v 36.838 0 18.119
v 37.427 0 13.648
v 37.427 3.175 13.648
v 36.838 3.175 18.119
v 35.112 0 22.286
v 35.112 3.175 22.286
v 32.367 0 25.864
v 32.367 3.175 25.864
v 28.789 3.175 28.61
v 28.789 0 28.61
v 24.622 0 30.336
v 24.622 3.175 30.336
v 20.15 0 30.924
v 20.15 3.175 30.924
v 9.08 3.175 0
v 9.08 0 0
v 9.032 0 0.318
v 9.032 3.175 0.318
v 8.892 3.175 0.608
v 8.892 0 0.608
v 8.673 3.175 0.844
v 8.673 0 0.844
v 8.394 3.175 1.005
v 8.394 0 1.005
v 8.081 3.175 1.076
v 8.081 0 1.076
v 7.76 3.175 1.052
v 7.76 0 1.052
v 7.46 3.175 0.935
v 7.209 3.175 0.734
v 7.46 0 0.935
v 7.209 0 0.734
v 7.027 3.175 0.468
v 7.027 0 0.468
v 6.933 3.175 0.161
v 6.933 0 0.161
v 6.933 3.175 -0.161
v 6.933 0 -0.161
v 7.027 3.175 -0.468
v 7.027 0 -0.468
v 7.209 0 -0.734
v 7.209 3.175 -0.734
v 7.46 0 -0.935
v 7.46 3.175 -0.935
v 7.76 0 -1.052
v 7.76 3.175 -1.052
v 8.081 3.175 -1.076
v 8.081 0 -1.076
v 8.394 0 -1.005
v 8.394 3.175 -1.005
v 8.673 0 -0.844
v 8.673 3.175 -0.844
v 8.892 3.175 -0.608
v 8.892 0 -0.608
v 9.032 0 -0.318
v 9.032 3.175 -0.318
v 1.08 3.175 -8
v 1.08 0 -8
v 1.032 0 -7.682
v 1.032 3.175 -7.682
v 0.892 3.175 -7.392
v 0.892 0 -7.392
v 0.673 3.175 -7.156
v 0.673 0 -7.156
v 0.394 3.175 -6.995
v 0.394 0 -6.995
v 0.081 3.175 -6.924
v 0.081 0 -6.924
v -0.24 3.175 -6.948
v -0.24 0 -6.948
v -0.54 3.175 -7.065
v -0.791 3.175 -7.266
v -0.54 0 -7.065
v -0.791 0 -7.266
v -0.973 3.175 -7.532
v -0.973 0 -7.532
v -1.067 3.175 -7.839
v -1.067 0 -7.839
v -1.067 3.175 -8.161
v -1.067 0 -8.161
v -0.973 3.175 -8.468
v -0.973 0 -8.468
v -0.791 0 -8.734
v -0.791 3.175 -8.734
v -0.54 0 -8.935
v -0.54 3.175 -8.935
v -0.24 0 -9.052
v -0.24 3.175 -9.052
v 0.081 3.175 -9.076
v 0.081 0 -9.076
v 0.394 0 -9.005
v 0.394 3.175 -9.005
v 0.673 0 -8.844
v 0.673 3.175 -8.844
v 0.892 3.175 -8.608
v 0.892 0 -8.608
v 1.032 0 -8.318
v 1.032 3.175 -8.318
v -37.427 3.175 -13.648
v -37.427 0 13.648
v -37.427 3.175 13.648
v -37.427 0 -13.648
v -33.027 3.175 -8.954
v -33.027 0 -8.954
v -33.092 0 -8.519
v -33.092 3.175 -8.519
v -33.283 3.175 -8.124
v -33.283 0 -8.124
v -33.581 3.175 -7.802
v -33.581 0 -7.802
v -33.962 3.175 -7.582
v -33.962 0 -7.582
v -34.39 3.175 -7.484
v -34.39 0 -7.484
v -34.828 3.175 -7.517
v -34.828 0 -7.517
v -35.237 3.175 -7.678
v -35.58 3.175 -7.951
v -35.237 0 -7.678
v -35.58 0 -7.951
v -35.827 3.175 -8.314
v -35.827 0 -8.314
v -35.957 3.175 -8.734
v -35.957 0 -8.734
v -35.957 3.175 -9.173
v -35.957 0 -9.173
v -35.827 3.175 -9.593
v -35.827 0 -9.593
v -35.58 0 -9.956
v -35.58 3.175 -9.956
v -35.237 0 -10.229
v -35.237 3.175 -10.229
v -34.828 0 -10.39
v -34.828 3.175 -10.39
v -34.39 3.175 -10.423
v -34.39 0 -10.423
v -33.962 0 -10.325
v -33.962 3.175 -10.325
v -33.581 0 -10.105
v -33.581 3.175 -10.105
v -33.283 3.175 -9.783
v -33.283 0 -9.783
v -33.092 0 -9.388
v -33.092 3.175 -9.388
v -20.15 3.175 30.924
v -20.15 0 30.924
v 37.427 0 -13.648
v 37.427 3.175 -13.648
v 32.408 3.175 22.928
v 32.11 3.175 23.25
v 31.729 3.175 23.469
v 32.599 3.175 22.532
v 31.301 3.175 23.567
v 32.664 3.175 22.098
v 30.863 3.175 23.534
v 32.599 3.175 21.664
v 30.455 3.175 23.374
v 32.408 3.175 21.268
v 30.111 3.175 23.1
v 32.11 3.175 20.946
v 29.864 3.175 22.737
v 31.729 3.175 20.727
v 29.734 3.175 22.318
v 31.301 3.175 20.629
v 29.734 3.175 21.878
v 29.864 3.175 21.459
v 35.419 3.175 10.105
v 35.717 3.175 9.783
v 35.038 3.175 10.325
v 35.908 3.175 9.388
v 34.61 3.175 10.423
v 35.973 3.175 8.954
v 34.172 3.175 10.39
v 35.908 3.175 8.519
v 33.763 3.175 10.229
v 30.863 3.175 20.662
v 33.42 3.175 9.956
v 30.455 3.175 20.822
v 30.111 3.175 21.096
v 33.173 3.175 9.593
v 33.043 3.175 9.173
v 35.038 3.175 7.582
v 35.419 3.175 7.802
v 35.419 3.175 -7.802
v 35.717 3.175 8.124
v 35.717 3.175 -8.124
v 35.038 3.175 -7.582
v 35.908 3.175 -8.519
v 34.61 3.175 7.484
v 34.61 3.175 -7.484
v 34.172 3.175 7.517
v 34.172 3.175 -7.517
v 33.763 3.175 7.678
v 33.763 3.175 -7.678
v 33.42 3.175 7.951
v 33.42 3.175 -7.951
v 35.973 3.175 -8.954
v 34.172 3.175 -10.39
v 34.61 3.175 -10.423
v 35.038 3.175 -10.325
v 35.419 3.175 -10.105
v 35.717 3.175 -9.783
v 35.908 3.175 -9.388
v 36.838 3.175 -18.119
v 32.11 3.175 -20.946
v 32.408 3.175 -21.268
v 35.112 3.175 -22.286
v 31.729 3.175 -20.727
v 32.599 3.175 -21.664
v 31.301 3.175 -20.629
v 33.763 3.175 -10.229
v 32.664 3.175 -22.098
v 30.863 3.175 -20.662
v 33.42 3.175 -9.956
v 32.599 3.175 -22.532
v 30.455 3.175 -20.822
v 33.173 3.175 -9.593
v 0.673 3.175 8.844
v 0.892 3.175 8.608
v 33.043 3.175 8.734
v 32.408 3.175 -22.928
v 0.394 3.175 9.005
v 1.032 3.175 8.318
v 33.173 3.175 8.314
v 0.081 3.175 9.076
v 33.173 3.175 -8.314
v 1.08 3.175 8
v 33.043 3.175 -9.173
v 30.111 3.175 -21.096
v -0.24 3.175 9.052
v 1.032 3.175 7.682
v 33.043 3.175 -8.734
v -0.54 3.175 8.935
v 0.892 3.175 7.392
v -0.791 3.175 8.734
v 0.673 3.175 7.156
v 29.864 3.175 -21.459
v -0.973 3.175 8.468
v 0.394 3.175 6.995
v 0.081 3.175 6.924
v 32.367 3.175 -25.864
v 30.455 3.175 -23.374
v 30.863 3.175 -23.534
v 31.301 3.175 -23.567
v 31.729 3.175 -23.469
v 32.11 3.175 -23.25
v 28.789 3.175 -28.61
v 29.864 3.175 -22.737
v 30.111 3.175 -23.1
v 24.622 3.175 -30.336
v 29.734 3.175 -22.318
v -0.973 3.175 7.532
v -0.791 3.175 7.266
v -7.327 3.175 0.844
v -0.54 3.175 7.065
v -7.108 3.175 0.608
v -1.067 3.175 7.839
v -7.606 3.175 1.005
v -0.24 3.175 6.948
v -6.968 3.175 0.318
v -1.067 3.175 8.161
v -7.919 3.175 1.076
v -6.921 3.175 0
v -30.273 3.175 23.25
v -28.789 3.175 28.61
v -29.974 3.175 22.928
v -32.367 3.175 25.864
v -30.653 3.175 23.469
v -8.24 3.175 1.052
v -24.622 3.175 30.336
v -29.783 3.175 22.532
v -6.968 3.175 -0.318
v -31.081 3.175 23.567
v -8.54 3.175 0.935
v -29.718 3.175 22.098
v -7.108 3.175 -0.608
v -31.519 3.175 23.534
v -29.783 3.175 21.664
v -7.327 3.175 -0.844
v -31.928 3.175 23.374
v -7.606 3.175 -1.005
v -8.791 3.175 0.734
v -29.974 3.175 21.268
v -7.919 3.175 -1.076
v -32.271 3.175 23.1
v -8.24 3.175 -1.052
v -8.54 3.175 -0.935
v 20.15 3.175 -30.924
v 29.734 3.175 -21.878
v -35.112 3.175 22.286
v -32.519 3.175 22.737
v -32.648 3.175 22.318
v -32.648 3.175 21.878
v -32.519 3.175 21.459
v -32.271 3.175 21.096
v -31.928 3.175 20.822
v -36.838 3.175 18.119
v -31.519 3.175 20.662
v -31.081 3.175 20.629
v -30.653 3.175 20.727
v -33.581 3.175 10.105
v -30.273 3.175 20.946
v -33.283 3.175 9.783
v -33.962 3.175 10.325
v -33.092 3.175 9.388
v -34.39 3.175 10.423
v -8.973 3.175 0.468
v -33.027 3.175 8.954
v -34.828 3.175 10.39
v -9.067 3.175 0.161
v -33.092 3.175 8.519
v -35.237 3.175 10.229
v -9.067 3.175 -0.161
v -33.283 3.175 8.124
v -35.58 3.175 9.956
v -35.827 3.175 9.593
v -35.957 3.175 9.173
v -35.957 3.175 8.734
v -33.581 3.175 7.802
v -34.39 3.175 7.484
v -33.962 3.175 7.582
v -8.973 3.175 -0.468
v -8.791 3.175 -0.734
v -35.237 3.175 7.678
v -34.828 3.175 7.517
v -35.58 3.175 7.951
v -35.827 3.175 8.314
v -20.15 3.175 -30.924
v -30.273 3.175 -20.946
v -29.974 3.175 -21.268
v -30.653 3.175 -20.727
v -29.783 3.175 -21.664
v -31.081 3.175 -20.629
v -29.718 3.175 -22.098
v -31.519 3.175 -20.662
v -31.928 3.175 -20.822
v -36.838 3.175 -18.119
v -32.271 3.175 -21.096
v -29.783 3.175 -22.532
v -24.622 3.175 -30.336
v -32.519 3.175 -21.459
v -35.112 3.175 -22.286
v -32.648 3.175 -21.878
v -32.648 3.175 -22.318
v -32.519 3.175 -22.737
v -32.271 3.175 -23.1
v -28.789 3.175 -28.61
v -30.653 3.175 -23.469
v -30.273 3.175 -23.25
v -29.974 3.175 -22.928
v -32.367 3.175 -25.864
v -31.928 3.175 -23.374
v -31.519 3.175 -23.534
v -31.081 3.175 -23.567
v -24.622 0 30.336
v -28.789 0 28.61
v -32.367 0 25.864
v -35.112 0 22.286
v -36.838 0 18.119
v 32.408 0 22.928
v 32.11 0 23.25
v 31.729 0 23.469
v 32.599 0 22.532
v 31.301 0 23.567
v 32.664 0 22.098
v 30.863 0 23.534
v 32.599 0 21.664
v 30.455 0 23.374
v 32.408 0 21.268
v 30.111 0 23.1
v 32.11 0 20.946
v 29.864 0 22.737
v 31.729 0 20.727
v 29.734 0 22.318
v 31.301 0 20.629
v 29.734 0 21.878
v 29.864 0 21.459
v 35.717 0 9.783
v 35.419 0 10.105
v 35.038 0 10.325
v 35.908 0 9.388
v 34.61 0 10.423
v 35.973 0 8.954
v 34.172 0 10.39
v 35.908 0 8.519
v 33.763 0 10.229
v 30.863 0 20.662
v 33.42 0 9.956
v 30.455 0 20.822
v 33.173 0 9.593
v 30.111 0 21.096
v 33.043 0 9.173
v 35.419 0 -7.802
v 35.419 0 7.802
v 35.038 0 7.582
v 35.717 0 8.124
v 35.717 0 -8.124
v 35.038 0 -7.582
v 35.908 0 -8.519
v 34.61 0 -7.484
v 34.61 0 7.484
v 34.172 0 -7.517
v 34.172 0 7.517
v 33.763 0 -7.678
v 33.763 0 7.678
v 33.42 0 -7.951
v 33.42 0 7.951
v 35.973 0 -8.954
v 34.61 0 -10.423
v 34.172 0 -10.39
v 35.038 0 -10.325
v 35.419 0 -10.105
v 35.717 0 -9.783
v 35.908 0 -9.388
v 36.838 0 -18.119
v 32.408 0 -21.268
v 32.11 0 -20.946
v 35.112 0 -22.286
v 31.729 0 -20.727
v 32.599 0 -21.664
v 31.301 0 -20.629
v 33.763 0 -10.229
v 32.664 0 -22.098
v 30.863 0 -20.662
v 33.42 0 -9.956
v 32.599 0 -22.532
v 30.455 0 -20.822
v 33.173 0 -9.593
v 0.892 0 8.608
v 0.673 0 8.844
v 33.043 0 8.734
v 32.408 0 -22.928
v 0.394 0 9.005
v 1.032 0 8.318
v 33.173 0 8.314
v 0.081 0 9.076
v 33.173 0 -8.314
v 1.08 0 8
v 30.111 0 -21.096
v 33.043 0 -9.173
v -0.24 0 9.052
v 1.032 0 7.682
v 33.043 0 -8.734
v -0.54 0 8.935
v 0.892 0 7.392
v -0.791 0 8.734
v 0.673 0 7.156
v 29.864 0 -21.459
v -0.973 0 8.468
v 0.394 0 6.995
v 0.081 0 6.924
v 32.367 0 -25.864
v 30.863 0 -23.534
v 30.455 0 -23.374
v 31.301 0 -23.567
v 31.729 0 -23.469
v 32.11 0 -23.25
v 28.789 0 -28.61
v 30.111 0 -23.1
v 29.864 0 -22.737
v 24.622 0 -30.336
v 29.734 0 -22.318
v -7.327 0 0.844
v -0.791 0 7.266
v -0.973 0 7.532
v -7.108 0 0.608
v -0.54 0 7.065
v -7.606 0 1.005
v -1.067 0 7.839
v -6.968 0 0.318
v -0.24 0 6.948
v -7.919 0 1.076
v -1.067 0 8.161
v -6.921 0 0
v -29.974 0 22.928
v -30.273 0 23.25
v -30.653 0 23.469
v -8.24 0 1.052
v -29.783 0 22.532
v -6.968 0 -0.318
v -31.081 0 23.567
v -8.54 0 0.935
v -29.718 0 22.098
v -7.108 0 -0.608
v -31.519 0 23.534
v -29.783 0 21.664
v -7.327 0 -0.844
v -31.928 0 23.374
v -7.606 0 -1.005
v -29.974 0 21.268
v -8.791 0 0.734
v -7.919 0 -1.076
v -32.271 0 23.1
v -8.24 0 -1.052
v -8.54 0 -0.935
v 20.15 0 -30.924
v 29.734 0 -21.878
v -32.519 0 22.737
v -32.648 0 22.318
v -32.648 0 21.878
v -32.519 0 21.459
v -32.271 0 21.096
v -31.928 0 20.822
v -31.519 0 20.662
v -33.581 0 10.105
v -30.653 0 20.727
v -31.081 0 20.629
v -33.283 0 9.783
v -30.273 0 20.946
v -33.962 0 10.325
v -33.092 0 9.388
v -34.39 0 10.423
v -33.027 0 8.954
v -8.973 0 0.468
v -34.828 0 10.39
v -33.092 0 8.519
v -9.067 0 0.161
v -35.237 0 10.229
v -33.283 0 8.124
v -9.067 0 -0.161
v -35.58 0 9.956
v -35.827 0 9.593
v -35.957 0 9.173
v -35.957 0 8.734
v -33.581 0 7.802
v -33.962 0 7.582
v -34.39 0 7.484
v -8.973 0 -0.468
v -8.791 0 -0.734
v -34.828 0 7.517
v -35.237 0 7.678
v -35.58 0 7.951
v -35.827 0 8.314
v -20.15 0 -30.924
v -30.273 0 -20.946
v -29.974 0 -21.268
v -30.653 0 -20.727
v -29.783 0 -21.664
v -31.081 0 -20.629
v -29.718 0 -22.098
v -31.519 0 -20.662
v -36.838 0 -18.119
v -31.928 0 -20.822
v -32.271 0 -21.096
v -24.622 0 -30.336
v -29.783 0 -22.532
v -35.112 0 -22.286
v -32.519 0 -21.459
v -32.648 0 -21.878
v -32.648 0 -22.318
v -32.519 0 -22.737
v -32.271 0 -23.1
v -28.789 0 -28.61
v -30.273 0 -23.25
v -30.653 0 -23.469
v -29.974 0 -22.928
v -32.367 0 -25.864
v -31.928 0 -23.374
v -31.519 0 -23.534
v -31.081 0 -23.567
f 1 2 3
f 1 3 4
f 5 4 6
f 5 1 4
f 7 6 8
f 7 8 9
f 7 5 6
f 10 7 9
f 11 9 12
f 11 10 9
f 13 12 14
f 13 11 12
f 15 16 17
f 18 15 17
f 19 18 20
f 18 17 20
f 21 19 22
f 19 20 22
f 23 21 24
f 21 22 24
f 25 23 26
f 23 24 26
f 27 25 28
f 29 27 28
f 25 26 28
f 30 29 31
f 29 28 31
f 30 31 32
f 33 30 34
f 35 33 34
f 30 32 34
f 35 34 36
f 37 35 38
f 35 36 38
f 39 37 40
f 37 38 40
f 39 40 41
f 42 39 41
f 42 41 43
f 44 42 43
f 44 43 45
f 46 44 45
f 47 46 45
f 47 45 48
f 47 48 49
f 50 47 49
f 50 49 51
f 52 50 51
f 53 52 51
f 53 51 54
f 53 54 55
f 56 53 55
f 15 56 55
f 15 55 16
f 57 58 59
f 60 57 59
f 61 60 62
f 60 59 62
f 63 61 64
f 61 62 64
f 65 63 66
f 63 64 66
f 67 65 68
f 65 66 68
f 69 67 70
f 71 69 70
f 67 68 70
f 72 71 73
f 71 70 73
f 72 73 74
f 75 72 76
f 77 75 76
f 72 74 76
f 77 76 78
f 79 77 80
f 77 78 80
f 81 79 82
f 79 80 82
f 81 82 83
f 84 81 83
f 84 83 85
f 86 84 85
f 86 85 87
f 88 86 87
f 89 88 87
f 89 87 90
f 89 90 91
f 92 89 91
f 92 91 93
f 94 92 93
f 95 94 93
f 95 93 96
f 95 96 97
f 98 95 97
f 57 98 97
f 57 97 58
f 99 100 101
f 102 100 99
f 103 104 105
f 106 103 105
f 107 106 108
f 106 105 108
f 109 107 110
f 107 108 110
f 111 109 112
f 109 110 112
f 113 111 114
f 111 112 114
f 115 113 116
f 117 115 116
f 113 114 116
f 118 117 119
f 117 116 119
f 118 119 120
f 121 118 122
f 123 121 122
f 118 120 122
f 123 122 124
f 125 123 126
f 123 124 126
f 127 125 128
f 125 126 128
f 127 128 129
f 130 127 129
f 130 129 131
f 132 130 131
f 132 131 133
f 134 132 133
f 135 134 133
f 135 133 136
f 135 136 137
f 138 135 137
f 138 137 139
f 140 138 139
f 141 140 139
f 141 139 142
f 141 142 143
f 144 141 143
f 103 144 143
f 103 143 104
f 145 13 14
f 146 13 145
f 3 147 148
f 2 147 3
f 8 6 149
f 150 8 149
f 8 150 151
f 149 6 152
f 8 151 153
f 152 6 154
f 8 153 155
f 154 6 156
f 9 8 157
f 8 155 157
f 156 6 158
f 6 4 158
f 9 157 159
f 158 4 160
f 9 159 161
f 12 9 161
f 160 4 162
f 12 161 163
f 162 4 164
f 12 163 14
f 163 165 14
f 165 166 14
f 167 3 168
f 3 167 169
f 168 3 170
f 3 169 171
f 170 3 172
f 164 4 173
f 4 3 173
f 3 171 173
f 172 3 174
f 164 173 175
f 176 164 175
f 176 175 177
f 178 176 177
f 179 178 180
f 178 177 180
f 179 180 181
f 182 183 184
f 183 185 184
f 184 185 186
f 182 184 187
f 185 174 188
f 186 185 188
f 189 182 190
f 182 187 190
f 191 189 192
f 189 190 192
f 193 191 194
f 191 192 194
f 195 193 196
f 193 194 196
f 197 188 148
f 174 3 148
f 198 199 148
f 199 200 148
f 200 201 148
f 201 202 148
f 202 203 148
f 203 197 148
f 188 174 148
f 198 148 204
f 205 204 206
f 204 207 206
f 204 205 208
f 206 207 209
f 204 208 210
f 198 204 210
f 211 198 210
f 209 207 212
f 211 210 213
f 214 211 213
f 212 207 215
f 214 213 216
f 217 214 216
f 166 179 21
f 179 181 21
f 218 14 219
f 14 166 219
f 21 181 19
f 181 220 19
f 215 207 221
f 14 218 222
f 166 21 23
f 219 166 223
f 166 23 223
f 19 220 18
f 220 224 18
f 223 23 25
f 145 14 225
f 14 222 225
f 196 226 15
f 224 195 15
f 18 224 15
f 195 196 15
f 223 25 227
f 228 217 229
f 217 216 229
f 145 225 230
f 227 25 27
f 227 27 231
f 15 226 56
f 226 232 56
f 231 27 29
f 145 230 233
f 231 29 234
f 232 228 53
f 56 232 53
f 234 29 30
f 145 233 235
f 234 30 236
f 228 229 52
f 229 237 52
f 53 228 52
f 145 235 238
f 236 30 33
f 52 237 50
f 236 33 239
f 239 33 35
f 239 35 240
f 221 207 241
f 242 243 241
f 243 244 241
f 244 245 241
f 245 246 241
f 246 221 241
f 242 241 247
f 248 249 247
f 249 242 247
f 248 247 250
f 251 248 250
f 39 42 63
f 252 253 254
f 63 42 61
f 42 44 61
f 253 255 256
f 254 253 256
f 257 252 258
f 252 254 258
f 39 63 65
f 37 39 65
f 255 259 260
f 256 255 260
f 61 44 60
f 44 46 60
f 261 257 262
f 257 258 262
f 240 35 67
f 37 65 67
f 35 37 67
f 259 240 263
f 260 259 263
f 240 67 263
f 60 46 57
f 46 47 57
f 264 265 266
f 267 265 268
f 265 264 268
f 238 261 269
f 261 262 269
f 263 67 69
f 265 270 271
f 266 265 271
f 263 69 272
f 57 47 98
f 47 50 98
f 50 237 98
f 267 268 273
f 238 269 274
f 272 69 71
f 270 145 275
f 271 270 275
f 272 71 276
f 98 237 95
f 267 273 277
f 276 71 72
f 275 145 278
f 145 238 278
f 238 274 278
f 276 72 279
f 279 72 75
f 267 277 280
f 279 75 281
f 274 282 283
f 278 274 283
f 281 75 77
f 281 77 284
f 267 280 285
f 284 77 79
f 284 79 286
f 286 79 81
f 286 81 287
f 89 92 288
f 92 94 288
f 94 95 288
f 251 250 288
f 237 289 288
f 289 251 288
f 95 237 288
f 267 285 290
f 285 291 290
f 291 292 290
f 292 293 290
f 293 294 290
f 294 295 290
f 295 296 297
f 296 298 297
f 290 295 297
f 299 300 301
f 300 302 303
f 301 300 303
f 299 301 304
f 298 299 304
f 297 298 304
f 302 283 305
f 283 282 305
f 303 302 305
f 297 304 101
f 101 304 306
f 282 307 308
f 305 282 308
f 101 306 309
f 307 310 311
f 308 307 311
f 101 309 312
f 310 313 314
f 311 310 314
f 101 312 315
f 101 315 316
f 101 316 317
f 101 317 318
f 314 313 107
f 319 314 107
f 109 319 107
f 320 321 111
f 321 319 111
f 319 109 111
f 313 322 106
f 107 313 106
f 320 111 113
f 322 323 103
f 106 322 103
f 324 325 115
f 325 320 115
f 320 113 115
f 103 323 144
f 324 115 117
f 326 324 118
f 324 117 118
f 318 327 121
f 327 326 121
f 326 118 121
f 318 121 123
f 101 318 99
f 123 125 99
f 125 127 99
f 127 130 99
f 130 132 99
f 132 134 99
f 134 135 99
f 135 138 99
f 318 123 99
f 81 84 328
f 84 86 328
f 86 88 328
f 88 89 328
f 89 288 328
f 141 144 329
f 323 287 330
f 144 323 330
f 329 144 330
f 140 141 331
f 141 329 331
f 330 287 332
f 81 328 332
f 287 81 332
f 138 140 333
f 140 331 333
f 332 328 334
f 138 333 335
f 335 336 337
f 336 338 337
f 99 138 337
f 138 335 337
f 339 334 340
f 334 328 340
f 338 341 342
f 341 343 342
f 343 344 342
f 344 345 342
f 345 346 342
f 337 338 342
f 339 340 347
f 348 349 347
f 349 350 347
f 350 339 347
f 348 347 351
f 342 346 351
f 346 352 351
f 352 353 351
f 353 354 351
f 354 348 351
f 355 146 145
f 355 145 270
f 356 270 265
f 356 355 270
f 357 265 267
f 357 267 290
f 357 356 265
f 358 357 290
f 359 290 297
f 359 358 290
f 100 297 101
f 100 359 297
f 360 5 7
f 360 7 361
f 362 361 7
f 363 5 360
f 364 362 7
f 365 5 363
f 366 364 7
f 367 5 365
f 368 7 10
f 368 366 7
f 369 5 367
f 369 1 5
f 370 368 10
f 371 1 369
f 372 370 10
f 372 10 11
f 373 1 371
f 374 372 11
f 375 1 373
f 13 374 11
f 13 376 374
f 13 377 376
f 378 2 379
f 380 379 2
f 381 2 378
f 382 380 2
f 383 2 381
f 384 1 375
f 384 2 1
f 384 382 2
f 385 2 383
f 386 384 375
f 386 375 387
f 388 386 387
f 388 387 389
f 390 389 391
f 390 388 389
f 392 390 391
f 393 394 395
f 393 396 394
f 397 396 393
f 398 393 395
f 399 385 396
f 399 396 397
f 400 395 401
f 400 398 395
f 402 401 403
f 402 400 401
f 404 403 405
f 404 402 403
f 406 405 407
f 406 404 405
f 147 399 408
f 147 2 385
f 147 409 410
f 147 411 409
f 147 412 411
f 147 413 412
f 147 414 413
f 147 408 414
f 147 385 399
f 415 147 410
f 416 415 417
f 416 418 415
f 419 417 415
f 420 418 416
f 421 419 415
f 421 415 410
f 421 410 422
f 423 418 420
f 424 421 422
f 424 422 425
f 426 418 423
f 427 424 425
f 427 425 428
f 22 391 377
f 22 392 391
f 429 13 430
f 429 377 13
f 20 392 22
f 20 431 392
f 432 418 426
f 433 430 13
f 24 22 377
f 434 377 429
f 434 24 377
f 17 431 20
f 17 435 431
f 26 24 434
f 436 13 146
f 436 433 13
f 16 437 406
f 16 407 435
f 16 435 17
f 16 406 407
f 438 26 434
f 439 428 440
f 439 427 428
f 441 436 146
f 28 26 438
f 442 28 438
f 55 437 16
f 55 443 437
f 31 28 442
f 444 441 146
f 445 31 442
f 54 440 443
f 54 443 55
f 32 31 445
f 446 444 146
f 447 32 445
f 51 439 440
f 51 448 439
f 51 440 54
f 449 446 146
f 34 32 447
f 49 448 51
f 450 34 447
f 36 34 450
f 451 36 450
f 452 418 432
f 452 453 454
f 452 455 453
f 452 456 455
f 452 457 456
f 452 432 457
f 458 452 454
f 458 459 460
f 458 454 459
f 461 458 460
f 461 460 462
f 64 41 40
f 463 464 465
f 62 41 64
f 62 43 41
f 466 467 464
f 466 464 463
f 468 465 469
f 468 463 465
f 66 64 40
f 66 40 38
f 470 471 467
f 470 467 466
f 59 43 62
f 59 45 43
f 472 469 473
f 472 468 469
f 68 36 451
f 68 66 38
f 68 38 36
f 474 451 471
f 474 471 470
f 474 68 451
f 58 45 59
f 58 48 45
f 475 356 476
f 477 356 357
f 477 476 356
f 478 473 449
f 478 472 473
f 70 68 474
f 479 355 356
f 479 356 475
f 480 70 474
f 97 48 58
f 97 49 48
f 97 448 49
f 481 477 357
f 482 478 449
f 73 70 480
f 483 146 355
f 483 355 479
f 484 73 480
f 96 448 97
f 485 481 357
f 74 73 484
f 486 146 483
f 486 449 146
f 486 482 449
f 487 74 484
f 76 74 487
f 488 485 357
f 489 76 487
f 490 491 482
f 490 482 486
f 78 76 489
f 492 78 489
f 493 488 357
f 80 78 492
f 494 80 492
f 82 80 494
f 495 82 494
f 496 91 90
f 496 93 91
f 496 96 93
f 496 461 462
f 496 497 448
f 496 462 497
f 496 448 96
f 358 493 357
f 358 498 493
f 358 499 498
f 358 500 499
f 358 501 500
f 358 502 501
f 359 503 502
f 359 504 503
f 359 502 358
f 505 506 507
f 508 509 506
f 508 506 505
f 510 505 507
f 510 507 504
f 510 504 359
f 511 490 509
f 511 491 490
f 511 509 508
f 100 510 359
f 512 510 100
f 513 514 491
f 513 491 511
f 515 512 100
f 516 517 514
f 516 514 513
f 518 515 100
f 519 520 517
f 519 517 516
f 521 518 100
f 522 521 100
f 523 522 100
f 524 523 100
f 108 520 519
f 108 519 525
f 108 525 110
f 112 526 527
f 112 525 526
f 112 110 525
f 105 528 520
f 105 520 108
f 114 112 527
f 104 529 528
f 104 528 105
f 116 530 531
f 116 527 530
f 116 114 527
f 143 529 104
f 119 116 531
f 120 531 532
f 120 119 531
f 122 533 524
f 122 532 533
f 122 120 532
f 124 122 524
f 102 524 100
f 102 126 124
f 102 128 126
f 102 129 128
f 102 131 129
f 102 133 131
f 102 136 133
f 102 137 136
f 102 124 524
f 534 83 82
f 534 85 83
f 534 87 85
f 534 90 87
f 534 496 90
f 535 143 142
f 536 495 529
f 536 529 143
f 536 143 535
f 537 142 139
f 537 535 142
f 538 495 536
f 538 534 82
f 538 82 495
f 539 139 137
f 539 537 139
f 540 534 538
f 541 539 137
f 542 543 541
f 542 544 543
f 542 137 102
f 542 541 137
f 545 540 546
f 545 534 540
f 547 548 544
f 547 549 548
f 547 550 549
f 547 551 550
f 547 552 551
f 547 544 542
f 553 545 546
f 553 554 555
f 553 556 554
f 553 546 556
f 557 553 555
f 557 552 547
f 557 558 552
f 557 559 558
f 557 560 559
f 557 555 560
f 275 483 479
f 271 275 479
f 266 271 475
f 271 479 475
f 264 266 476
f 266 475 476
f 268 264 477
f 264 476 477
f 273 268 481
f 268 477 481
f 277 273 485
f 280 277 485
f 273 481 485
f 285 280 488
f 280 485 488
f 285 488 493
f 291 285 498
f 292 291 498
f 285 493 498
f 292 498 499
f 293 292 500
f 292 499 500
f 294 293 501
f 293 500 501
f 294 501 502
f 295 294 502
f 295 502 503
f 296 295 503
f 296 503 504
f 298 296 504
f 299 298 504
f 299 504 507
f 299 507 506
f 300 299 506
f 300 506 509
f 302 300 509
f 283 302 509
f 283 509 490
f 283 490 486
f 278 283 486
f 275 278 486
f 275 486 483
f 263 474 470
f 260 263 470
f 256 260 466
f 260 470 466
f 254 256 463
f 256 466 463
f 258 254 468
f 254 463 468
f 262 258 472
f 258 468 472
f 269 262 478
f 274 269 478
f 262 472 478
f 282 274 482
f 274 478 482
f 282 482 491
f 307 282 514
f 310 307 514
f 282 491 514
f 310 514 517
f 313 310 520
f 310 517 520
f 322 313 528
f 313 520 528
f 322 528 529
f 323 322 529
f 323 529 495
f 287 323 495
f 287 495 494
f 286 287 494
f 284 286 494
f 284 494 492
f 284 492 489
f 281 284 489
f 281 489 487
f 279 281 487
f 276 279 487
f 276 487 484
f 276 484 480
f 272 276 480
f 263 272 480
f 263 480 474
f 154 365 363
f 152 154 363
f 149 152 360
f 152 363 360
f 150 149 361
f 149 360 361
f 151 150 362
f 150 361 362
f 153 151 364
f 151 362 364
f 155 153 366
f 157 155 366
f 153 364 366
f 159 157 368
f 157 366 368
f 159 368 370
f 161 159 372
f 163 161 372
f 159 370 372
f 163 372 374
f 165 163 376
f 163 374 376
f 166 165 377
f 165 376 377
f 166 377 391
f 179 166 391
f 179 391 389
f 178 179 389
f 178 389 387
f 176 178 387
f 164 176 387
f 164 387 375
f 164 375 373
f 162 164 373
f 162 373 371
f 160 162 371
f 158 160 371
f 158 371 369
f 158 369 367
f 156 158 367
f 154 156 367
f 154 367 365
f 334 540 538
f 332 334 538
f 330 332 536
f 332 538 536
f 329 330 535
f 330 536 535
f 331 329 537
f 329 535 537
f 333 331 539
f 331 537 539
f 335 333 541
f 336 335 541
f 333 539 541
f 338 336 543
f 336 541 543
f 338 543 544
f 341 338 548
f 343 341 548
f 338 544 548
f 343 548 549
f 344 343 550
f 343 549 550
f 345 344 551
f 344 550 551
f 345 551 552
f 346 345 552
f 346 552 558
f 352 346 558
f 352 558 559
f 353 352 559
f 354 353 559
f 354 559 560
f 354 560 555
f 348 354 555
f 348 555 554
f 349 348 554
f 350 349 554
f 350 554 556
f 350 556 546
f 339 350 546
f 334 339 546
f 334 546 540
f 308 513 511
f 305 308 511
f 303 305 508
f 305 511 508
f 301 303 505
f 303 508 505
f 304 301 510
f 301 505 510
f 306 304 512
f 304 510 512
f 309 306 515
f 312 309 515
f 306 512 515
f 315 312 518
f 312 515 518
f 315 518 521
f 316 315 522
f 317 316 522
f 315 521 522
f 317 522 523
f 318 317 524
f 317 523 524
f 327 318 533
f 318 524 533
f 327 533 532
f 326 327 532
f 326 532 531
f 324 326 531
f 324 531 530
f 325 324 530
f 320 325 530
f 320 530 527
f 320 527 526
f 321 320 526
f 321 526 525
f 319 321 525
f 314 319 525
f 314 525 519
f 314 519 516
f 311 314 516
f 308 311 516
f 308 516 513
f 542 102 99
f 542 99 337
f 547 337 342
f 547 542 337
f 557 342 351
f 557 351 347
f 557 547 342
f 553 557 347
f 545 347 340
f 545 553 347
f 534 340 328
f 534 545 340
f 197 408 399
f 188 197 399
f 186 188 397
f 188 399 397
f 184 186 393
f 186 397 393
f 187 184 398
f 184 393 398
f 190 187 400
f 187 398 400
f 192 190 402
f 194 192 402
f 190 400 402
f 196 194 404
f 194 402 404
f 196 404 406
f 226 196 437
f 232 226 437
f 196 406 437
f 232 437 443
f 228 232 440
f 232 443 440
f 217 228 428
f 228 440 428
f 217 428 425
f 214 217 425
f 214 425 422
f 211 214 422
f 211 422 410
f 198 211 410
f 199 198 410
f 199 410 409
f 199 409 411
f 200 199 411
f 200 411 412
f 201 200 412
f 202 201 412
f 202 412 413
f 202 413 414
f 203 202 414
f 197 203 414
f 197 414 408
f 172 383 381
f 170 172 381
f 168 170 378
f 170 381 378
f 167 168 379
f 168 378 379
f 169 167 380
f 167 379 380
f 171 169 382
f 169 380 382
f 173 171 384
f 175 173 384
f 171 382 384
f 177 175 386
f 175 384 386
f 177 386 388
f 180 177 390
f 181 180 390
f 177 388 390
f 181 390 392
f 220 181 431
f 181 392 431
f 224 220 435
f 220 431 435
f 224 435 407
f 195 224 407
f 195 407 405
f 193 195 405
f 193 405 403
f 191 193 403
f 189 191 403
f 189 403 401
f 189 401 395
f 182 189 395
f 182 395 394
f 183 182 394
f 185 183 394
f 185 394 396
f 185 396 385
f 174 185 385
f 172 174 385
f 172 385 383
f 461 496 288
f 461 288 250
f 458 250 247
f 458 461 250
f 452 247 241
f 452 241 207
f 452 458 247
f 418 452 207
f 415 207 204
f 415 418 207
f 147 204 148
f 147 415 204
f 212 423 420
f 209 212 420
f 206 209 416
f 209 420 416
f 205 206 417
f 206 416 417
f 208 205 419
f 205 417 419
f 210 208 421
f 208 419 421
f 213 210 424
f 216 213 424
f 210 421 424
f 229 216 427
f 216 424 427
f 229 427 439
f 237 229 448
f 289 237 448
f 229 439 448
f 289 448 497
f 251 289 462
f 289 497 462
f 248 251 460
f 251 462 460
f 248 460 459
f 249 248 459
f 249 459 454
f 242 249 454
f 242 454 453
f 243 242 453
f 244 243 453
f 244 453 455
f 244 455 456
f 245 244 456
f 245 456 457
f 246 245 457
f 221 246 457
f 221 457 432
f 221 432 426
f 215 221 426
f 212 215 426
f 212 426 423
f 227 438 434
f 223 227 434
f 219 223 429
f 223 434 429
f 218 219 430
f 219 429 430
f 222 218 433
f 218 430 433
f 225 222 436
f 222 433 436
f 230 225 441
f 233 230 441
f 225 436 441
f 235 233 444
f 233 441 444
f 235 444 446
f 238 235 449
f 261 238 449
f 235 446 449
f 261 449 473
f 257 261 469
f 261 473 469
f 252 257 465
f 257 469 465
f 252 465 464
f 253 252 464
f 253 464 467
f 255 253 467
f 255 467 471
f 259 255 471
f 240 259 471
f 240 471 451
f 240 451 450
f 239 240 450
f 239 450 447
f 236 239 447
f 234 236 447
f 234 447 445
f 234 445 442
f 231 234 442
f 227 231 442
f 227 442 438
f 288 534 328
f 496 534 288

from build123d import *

# Parameters (mm, degrees)
BOSS_EXTRUDE1_DEPTH   = 3.175
F_4_CLEARANCE_HOLE1_D = 2.159
F_4_CLEARANCE_HOLE2_D = 2.9464


with BuildPart() as part:
    # Sketch1 → Boss-Extrude1 (new body)
    with BuildSketch(Plane(origin=(0, 0, 0), x_dir=(1, 0, 0), z_dir=(0, 1, 0))):
        with BuildLine():
            Line((20.150112608, -30.9245), (-20.150112608, -30.9245))
            ThreePointArc((-20.150112608, -30.9245), (-32.36664613, -25.86424613), (-37.4269, -13.647712608))
            Line((-37.4269, -13.647712608), (-37.4269, 13.647712608))
            ThreePointArc((-37.4269, 13.647712608), (-32.36664613, 25.86424613), (-20.150112608, 30.9245))
            Line((-20.150112608, 30.9245), (20.150112608, 30.9245))
            ThreePointArc((20.150112608, 30.9245), (32.36664613, 25.86424613), (37.4269, 13.647712608))
            Line((37.4269, 13.647712608), (37.4269, -13.647712608))
            ThreePointArc((37.4269, -13.647712608), (32.36664613, -25.86424613), (20.150112608, -30.9245))
        make_face()
    extrude(amount=BOSS_EXTRUDE1_DEPTH)

    # #4 Clearance Hole1 (through all)
    with Locations(Plane(origin=(0, 3.175, 0), x_dir=(-1, 0, 0), z_dir=(0, 1, 0))):
        with Locations((0, -8), (-8, 0), (0, 8), (8, 0)):
            Hole(F_4_CLEARANCE_HOLE1_D / 2)

    # #4 Clearance Hole2 (through all)
    with Locations(Plane(origin=(0, 3.175, 0), x_dir=(-1, 0, 0), z_dir=(0, 1, 0))):
        with Locations((31.1912, -22.098), (-31.1912, -22.098), (-31.1912, 22.098), (31.1912, 22.098), (34.5, -8.9535), (34.5, 8.9535), (-34.5, 8.9535), (-34.5, -8.9535)):
            Hole(F_4_CLEARANCE_HOLE2_D / 2)


solid = part.part
